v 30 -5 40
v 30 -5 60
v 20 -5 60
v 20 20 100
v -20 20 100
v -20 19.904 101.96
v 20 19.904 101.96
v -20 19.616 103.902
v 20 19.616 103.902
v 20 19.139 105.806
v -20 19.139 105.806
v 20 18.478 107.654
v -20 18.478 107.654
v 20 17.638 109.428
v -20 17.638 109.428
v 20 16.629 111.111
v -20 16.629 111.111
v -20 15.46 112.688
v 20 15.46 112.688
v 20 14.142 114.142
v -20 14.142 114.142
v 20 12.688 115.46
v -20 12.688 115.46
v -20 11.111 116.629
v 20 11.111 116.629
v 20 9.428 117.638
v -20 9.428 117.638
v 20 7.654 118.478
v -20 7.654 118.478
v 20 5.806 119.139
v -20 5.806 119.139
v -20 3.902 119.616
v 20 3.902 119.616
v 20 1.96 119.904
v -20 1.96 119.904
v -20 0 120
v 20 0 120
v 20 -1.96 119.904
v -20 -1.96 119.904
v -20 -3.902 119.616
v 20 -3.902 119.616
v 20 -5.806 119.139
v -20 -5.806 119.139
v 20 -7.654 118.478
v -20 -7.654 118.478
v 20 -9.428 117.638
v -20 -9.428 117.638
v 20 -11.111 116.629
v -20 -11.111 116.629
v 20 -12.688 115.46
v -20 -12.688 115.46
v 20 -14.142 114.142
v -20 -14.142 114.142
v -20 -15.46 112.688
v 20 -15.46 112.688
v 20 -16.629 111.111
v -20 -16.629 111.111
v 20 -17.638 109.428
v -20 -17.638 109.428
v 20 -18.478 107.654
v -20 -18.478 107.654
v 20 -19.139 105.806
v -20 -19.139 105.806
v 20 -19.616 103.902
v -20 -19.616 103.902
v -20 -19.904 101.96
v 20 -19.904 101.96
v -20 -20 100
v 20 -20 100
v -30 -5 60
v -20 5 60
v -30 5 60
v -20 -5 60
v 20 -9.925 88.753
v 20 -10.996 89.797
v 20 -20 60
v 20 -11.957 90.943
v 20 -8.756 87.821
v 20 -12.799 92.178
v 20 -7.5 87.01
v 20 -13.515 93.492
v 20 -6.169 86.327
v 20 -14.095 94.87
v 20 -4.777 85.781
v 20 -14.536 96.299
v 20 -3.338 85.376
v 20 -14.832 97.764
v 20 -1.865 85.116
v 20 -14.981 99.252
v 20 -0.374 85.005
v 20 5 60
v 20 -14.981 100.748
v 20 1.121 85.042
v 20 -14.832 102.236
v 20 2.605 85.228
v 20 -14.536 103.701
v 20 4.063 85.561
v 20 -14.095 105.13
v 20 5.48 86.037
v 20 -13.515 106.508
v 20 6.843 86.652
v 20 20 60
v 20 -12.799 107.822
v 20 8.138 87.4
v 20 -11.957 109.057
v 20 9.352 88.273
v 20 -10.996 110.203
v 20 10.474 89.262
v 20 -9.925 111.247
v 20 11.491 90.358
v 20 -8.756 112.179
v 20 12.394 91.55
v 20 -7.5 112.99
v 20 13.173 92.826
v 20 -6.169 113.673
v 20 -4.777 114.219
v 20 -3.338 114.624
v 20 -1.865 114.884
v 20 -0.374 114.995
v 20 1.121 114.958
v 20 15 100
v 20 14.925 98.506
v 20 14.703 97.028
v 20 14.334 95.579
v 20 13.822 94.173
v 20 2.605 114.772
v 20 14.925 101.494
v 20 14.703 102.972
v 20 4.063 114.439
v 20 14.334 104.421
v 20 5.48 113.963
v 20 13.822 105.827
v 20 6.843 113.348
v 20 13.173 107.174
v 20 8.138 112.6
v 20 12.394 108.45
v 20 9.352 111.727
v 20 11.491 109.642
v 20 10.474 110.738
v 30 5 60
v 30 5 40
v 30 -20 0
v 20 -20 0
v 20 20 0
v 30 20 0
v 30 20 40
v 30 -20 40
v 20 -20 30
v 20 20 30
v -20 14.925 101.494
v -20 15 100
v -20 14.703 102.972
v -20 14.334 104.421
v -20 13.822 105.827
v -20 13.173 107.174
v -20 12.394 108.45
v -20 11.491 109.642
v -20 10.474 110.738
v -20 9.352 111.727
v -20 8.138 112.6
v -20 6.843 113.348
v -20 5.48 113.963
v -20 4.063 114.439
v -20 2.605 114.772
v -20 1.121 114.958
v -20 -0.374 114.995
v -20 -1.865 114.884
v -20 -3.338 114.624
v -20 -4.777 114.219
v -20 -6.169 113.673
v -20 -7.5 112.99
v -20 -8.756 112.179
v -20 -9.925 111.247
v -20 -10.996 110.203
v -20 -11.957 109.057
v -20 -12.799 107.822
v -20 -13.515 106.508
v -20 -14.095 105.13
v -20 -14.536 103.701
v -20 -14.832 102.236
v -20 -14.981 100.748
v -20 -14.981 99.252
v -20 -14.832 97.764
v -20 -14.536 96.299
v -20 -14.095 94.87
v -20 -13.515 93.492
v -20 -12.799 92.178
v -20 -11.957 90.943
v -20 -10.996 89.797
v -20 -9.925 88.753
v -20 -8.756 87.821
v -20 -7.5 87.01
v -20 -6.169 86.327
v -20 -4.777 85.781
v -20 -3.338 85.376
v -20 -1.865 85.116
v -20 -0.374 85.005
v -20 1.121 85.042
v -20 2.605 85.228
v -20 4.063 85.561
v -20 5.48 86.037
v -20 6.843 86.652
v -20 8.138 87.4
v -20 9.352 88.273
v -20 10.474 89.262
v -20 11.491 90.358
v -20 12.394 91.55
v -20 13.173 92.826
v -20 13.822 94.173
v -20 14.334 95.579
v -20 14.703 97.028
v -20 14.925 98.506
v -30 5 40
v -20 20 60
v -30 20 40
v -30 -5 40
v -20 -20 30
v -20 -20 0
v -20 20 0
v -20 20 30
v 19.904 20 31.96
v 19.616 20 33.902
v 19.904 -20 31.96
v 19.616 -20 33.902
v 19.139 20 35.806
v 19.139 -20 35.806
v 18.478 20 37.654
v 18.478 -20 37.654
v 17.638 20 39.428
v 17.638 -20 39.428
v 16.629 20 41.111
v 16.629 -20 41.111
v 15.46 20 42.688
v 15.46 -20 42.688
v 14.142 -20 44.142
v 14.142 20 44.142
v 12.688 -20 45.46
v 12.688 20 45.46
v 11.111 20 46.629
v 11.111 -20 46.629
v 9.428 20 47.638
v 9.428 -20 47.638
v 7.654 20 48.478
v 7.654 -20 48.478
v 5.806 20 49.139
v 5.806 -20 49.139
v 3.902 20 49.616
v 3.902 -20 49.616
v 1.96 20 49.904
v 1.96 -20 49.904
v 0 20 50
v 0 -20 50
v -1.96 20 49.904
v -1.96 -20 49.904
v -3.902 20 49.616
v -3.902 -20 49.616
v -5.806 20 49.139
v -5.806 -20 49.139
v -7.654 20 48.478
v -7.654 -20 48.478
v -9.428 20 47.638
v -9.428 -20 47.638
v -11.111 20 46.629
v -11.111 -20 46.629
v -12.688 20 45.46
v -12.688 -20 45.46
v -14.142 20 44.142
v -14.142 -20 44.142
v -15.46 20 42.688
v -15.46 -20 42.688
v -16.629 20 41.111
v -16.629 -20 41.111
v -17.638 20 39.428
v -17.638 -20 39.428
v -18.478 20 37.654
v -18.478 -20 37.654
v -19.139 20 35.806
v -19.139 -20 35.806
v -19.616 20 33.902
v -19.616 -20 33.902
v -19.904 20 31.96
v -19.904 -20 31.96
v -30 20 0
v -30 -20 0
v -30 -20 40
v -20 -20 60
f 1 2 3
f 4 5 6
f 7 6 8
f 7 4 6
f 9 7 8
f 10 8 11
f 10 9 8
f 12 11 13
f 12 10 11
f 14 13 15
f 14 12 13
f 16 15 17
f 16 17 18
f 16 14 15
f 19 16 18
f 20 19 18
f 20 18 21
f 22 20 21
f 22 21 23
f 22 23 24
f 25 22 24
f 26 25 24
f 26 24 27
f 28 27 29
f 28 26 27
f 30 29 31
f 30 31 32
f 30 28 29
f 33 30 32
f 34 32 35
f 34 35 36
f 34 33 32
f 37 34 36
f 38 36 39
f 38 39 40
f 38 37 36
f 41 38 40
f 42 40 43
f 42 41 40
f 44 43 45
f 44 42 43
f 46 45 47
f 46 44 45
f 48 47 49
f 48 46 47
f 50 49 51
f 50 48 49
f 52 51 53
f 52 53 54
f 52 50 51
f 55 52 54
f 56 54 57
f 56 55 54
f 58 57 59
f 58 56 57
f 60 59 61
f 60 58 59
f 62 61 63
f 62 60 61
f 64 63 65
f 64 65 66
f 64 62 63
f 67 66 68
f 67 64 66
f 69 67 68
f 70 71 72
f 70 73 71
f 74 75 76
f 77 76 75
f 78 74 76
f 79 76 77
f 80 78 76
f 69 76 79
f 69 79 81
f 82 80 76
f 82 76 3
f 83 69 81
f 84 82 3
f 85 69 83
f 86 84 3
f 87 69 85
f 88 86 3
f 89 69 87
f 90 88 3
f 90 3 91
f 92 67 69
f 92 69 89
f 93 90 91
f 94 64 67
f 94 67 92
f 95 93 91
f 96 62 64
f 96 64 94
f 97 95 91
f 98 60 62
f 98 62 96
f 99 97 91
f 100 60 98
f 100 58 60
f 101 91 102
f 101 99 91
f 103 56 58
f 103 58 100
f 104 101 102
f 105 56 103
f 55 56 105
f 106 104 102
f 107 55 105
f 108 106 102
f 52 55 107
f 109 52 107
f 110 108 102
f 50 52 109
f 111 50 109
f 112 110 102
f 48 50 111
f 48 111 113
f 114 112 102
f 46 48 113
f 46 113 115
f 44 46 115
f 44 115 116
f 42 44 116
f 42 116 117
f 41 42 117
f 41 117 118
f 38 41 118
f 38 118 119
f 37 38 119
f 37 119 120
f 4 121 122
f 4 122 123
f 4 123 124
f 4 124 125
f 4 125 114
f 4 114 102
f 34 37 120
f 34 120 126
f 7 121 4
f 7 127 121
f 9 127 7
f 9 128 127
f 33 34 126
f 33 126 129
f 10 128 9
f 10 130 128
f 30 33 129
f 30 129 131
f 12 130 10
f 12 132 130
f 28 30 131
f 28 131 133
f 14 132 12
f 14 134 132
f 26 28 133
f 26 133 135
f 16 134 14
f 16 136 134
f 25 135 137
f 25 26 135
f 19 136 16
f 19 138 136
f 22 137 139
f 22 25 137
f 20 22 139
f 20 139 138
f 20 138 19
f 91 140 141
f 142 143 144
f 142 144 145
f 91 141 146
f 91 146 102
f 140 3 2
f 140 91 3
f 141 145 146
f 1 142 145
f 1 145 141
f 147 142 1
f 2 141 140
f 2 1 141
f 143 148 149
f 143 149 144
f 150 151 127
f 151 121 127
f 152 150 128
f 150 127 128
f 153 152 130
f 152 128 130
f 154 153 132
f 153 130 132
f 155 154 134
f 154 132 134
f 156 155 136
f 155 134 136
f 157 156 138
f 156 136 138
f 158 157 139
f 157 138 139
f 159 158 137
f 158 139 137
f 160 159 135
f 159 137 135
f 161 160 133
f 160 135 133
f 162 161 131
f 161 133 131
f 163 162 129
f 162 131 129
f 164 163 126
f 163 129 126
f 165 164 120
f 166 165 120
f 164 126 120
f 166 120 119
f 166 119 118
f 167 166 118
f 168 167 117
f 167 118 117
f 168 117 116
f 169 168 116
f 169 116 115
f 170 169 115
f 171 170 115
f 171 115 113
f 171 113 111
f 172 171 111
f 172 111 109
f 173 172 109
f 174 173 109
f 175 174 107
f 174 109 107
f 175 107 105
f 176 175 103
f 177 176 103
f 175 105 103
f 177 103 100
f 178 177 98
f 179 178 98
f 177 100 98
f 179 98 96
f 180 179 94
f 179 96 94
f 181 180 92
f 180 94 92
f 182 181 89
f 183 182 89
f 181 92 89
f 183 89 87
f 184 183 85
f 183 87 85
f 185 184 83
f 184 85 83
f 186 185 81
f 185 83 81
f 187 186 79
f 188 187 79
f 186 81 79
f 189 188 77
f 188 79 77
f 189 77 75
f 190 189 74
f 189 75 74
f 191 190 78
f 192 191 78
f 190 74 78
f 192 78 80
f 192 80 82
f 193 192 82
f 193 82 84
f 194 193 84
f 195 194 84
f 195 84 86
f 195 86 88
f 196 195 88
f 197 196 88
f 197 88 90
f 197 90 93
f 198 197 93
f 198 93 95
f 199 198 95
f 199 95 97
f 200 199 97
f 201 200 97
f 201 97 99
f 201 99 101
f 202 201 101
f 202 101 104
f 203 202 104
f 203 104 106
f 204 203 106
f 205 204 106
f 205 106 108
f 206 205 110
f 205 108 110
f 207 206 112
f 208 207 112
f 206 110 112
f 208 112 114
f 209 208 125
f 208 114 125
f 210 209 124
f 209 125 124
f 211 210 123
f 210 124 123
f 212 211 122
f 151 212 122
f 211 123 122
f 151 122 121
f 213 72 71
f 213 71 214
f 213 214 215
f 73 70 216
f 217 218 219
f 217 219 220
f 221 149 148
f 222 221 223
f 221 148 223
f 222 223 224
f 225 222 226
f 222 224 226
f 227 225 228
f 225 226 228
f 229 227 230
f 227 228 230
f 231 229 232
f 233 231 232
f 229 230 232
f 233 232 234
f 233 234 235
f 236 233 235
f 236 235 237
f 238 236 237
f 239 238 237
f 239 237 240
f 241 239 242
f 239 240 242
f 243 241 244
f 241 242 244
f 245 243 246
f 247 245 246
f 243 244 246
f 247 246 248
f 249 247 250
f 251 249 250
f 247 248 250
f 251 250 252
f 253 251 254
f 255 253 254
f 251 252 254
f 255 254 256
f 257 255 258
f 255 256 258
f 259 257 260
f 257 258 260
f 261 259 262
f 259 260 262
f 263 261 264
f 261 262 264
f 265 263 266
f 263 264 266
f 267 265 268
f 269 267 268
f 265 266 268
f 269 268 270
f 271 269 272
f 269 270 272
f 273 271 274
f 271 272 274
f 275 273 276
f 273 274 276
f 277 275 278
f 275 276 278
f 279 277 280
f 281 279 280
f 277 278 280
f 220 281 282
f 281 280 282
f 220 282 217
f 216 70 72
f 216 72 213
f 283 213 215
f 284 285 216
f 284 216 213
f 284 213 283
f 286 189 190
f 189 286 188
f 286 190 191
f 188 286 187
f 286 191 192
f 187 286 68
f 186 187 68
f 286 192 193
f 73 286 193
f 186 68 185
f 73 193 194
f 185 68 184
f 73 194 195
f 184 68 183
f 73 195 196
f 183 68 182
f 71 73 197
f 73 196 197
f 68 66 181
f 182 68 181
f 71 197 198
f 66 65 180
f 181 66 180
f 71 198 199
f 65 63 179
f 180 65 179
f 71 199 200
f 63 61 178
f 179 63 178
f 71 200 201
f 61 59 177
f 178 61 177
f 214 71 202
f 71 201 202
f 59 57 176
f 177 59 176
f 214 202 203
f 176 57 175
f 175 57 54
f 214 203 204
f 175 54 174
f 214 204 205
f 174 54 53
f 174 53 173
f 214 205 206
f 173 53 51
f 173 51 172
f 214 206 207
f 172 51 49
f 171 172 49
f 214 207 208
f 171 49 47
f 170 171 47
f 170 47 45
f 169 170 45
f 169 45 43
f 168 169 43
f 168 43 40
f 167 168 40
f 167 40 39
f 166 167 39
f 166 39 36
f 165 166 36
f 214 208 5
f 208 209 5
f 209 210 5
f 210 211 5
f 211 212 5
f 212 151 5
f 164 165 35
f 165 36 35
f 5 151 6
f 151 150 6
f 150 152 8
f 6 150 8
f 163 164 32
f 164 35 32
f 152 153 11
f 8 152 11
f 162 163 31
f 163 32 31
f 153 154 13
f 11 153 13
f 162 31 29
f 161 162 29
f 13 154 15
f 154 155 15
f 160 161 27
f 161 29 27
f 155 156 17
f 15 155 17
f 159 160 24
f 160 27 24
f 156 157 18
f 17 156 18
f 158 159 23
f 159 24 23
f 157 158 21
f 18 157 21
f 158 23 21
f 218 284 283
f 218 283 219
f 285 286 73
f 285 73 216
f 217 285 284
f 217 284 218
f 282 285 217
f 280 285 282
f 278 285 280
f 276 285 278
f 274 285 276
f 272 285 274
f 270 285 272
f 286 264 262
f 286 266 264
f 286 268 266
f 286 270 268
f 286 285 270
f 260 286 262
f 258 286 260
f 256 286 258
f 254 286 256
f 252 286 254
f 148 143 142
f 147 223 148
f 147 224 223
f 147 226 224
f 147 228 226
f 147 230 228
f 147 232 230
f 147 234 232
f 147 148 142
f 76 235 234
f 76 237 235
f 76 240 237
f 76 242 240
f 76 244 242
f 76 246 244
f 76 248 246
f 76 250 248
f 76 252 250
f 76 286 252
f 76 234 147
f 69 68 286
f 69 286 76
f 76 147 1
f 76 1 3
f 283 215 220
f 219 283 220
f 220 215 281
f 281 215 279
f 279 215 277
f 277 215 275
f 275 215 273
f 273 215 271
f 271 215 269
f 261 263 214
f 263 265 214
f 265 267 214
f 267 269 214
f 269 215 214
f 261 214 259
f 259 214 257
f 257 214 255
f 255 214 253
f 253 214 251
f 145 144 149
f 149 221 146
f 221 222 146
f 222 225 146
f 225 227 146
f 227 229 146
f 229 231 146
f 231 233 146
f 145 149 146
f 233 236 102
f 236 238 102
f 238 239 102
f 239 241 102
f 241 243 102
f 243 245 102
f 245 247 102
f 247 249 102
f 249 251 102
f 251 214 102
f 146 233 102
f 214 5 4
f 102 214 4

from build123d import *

# Parameters (mm, degrees)
PAD_DEPTH         = 20
PAD001_DEPTH      = 20
SKETCH002_R       = 15
POCKET_DEPTH      = 30.001
POCKET_DEPTH_BACK = -30.001
PAD002_DEPTH      = 5


with BuildPart() as part:
    # Sketch → Pad (new body, symmetric)
    with BuildSketch(Plane.XZ):
        with BuildLine():
            Line((20, 100), (-20, 100))
            Line((-20, 100), (-20, 60))
            Line((-20, 60), (-30, 40))
            Line((-30, 40), (-30, 0))
            Line((-30, 0), (-20, 0))
            Line((-20, 0), (-20, 30))
            ThreePointArc((20, 30), (0, 50), (-20, 30))
            Line((20, 30), (20, 0))
            Line((20, 0), (30, 0))
            Line((30, 0), (30, 40))
            Line((30, 40), (20, 60))
            Line((20, 60), (20, 100))
        make_face()
    extrude(amount=PAD_DEPTH, both=True)

    # Sketch001 → Pad001 (join, symmetric)
    with BuildSketch(Plane.YZ):
        with BuildLine():
            ThreePointArc((20, 100), (0, 120), (-20, 100))
            Line((-20, 100), (20, 100))
        make_face()
    extrude(amount=PAD001_DEPTH, both=True)

    # Sketch002 → Pocket (cut, two sides)
    with BuildSketch(Plane.YZ) as pocket_sk:
        with Locations((0, 100)):
            Circle(SKETCH002_R)
    extrude(amount=-POCKET_DEPTH, mode=Mode.SUBTRACT)
    extrude(pocket_sk.sketch, amount=-POCKET_DEPTH_BACK, mode=Mode.SUBTRACT)

    # Sketch003 → Pad002 (join, symmetric)
    with BuildSketch(Plane.XZ):
        Polygon((20, 60), (30, 60), (30, 40), align=None)
        Polygon((-30, 60), (-30, 40), (-20, 60), align=None)
    extrude(amount=PAD002_DEPTH, both=True)


solid = part.part
